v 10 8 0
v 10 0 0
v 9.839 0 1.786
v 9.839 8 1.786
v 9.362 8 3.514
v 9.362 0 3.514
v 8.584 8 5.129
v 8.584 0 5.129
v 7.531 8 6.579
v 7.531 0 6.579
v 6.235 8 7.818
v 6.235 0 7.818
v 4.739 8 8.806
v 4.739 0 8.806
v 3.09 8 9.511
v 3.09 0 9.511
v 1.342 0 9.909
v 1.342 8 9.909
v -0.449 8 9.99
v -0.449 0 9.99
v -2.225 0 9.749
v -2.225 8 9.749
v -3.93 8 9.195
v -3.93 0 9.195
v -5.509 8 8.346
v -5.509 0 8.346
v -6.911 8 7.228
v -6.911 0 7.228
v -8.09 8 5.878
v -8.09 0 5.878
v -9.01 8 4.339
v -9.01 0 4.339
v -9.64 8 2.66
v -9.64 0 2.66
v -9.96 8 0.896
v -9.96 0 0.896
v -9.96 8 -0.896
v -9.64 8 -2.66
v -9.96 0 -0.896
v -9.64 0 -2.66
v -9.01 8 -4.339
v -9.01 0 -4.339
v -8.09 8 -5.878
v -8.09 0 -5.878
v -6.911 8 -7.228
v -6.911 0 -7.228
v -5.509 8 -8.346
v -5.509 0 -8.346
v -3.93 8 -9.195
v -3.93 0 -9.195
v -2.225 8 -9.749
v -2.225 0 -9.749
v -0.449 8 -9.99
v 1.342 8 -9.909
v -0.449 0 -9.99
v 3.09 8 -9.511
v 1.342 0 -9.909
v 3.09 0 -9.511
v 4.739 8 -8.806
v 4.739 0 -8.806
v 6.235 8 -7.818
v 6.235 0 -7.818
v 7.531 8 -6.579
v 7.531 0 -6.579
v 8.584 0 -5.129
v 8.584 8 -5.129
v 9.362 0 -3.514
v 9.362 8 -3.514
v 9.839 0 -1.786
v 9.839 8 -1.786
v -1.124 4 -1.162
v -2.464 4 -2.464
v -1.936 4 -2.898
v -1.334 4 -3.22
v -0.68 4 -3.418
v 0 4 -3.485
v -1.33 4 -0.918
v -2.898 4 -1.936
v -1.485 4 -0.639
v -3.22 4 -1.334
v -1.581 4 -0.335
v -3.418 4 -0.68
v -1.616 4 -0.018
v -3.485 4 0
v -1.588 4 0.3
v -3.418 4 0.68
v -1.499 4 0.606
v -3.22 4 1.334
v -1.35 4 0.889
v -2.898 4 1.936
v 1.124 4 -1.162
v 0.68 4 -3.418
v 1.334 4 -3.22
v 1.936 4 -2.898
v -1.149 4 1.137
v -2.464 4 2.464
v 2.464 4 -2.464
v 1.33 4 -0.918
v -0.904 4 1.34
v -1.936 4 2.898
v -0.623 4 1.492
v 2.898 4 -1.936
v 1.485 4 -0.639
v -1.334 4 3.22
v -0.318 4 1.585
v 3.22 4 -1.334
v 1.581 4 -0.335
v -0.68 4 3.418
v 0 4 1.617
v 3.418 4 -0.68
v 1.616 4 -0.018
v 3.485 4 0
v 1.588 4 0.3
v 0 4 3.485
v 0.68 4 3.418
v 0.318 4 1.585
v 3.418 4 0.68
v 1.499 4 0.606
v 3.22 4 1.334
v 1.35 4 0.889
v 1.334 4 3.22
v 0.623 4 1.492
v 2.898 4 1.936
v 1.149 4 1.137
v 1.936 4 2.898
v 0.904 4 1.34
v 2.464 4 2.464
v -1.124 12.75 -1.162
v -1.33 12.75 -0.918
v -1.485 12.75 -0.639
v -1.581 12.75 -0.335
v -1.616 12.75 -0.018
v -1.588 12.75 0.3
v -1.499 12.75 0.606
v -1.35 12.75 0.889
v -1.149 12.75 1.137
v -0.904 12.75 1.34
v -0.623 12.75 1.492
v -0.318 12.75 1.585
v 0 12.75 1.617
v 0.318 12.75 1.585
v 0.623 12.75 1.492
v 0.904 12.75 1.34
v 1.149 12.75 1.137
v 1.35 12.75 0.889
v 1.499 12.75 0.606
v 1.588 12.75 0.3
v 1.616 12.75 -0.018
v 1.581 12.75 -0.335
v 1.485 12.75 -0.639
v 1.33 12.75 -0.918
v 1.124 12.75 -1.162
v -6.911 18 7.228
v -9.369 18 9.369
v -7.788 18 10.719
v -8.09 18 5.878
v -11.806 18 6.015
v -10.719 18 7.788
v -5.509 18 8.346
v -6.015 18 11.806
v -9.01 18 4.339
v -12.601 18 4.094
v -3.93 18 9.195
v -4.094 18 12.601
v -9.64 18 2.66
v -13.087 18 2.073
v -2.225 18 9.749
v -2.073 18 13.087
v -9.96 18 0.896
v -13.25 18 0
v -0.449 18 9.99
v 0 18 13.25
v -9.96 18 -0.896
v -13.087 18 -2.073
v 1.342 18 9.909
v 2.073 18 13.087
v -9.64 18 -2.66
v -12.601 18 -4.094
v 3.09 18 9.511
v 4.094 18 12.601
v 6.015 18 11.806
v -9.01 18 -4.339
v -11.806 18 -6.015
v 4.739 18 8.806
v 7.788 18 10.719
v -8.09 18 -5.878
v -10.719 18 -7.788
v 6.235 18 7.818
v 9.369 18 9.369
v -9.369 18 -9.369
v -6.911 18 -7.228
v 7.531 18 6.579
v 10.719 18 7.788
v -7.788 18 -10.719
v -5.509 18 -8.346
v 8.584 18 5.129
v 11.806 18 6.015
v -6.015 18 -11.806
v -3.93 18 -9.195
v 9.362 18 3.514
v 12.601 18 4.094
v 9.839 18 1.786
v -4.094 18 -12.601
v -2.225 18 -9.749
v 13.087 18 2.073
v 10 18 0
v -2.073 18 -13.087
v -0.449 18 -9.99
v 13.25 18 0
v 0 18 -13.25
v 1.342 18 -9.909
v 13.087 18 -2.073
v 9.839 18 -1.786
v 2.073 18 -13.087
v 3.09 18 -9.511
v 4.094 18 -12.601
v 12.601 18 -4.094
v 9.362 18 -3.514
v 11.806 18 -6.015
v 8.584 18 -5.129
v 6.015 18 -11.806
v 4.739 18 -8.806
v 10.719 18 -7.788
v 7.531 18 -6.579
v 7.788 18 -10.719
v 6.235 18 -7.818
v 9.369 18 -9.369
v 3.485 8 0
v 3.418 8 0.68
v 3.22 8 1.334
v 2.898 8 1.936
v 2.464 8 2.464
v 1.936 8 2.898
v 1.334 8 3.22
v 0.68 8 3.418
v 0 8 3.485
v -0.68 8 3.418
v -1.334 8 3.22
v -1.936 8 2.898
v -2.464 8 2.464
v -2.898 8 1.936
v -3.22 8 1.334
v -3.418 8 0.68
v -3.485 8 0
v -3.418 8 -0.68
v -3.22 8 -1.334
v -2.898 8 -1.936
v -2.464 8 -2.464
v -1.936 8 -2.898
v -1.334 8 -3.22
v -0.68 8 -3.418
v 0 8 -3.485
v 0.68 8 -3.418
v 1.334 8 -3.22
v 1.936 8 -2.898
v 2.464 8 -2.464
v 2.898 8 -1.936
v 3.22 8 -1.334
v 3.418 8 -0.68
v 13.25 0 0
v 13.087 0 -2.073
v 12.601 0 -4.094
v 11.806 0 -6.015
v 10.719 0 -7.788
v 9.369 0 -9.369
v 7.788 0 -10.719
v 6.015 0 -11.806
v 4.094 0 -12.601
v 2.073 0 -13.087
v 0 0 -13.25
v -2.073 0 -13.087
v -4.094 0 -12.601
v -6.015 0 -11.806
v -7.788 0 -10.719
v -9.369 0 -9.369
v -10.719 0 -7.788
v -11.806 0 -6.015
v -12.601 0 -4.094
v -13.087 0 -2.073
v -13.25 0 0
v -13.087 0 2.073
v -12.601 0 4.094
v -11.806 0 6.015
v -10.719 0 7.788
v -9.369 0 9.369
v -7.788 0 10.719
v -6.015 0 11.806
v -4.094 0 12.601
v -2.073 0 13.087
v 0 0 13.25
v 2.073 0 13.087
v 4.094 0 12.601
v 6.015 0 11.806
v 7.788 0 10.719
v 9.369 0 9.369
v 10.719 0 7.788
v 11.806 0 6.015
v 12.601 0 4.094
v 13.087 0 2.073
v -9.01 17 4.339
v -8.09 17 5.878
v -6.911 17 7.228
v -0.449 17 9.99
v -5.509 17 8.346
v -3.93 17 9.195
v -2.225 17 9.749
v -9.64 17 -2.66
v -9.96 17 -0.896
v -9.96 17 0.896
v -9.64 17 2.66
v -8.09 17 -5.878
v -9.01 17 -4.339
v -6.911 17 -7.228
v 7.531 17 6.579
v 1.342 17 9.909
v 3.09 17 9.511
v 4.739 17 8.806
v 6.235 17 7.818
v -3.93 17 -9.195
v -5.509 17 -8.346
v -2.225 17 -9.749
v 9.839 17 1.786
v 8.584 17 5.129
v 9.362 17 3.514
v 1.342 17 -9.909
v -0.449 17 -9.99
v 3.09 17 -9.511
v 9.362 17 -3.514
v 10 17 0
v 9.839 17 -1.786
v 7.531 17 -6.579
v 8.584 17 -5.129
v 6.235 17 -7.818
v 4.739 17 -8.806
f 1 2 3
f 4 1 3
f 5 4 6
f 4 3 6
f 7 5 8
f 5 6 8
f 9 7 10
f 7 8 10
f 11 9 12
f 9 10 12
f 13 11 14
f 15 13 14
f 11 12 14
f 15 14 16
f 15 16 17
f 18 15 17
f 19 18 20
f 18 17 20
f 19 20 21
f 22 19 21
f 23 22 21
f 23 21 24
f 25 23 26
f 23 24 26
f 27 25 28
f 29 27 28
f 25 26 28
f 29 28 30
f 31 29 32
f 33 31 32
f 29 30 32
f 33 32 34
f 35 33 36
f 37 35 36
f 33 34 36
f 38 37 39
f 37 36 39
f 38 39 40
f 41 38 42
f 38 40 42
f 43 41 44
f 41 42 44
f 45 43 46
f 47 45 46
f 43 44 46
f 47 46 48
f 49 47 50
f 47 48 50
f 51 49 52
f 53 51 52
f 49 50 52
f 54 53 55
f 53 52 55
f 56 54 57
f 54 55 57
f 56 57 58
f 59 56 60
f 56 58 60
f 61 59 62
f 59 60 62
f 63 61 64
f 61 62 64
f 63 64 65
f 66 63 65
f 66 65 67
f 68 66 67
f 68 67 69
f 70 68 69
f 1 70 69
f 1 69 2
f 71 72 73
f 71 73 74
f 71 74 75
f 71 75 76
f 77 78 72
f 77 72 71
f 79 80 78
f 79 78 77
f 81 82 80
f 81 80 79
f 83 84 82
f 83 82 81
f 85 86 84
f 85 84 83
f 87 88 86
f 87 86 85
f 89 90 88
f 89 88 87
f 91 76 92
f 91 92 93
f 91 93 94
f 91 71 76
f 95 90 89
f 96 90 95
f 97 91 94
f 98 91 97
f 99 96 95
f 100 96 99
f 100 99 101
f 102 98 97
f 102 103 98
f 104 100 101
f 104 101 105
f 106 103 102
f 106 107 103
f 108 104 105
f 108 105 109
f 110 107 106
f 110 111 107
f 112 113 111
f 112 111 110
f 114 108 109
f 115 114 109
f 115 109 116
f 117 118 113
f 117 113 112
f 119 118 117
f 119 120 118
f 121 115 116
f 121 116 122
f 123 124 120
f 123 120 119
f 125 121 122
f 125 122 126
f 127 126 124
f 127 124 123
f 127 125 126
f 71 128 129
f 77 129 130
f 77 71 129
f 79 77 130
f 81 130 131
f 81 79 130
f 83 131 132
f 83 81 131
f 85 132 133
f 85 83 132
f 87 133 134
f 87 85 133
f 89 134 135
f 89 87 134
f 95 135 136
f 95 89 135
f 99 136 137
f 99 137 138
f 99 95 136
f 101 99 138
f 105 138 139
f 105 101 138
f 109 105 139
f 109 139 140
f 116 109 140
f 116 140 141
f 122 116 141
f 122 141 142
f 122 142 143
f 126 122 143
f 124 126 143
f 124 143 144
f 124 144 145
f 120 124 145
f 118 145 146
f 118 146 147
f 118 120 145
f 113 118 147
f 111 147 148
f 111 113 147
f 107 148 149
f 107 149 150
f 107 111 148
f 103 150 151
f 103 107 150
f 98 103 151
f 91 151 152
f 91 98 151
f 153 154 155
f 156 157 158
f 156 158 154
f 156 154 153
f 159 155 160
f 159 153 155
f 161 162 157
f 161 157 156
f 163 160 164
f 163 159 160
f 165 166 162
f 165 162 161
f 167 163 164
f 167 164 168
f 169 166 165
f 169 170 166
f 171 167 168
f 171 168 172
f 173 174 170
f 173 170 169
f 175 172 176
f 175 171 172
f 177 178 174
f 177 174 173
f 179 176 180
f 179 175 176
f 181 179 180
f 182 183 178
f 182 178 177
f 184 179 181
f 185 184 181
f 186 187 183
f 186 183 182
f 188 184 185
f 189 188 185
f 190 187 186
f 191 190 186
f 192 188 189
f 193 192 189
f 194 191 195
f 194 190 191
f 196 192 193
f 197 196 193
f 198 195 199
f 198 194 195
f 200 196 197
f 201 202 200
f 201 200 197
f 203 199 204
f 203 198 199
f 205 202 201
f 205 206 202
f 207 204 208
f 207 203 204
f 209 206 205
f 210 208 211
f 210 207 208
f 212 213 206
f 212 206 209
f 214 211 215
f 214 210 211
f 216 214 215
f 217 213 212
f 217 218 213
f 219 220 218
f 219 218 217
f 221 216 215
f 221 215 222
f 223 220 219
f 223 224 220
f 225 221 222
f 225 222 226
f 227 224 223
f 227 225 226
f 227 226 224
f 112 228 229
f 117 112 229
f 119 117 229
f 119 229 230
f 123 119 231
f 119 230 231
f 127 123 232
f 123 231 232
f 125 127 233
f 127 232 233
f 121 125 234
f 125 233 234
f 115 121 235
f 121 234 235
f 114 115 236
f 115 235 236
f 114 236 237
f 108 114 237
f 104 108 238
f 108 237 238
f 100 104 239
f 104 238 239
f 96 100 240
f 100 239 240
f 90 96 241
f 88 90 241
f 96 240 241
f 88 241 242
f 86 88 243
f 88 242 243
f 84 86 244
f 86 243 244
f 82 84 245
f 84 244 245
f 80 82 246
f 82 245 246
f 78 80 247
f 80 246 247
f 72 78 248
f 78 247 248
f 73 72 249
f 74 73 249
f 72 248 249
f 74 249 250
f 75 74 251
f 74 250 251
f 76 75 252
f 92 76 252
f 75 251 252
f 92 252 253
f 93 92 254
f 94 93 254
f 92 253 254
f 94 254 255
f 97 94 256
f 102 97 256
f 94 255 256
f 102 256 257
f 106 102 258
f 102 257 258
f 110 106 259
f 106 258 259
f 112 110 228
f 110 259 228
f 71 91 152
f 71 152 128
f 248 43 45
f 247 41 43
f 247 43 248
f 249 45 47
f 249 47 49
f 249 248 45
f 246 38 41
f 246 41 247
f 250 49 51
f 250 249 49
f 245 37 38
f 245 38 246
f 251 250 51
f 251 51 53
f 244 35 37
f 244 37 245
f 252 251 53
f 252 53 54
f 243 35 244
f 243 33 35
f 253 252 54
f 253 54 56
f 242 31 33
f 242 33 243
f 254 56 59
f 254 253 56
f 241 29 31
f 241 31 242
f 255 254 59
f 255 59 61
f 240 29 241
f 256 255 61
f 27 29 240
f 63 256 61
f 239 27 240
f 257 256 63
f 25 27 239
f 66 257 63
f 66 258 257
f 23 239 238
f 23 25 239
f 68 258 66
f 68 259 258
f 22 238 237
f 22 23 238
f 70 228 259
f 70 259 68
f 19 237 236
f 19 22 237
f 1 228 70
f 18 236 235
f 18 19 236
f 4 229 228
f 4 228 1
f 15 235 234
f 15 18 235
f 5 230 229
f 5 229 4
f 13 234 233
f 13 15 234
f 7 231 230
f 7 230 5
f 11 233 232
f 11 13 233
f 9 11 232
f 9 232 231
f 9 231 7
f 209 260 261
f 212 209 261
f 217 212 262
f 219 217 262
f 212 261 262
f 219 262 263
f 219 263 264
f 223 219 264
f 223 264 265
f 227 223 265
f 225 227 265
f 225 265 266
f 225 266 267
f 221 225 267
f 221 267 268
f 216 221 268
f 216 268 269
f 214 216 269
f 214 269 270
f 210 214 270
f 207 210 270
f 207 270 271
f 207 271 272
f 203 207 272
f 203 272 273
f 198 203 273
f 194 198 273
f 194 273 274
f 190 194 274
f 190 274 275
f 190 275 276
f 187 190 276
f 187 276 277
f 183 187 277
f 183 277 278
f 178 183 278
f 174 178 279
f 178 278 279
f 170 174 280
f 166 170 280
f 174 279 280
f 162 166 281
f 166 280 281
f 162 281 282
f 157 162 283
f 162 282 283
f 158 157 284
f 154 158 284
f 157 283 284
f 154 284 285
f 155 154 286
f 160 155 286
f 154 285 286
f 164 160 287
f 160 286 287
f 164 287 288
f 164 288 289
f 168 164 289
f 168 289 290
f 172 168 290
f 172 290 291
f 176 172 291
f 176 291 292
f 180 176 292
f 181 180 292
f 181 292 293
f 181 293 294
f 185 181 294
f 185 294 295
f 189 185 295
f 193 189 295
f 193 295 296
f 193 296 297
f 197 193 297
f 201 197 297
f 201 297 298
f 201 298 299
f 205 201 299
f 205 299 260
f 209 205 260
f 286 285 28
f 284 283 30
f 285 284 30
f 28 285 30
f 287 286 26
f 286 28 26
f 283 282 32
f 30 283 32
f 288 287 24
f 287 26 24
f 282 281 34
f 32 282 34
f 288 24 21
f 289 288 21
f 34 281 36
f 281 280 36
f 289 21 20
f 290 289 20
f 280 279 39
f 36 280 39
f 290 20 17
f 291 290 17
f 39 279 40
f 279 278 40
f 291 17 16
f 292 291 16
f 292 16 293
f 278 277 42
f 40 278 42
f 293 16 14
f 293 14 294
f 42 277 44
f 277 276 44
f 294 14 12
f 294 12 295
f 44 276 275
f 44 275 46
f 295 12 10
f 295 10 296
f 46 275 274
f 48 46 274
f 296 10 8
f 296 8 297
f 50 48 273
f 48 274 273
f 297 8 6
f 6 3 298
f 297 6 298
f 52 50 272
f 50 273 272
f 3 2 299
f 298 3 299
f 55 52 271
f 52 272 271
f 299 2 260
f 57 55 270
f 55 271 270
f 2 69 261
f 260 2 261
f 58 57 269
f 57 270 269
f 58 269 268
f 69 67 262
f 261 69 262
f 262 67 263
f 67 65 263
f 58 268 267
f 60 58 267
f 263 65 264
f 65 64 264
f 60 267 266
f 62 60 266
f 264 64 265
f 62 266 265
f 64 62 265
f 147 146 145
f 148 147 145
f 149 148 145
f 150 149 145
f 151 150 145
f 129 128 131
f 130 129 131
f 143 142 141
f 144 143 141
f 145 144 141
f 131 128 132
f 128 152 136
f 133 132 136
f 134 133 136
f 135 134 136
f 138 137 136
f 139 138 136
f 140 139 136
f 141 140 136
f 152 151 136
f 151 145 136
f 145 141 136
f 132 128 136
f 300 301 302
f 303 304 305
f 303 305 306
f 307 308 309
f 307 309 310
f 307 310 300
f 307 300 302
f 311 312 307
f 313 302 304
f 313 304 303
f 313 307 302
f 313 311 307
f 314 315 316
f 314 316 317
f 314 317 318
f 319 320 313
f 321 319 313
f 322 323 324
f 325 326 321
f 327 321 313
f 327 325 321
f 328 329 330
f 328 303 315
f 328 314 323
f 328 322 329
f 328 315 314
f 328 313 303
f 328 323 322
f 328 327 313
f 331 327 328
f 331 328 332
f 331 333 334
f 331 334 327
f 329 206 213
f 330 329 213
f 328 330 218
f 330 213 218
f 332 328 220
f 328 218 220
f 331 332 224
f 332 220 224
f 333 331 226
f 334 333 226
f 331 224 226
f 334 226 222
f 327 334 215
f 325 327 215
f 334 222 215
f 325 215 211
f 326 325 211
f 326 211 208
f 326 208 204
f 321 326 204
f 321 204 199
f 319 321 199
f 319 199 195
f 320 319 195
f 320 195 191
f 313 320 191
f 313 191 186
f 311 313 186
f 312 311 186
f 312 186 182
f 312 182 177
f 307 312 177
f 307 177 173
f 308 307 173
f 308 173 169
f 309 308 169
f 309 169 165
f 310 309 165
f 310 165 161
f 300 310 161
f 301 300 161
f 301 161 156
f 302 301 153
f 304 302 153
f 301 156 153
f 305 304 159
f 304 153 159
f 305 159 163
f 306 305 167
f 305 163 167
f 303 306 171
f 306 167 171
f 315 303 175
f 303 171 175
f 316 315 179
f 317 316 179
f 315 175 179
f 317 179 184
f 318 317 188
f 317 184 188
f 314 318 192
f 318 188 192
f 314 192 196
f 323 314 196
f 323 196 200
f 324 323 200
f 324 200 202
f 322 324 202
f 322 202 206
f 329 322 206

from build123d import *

# Parameters (mm, degrees)
SKETCH1_R           = 13.25
BOSS_EXTRUDE1_DEPTH = 35
SKETCH7_R           = 10
CUT_EXTRUDE4_DEPTH  = 8
SKETCH10_R          = 3.485
BOSS_EXTRUDE3_DEPTH = 4
CUT_EXTRUDE5_DEPTH  = 8.75
SKETCH13_R          = 10
CUT_EXTRUDE6_DEPTH  = 18
SKETCH14_R          = 13.25
CUT_EXTRUDE7_DEPTH  = 17


with BuildPart() as part:
    # Sketch1 → Boss-Extrude1 (new body)
    with BuildSketch(Plane(origin=(0, 0, 0), x_dir=(1, 0, 0), z_dir=(0, 1, 0))):
        Circle(SKETCH1_R)
    extrude(amount=BOSS_EXTRUDE1_DEPTH)

    # Sketch7 → Cut-Extrude4 (cut)
    with BuildSketch(Plane.XZ):
        Circle(SKETCH7_R)
    extrude(amount=-CUT_EXTRUDE4_DEPTH, mode=Mode.SUBTRACT)

    # Sketch10 → Boss-Extrude3 (add)
    with BuildSketch(Plane.XZ.offset(-8)):
        Circle(SKETCH10_R)
    extrude(amount=BOSS_EXTRUDE3_DEPTH)

    # Sketch11 → Cut-Extrude5 (cut)
    with BuildSketch(Plane.XZ.offset(-4)):
        with BuildLine():
            Line((1.123990489, -1.161812868), (-1.123990489, -1.161812868))
            ThreePointArc((-1.123990489, -1.161812868), (0, 1.616528304), (1.123990489, -1.161812868))
        make_face()
    extrude(amount=-CUT_EXTRUDE5_DEPTH, mode=Mode.SUBTRACT)

    # Sketch13 → Cut-Extrude6 (cut)
    with BuildSketch(Plane(origin=(0, 35, 0), x_dir=(1, 0, 0), z_dir=(0, 1, 0))):
        Circle(SKETCH13_R)
    extrude(amount=-CUT_EXTRUDE6_DEPTH, mode=Mode.SUBTRACT)

    # Sketch14 → Cut-Extrude7 (cut)
    with BuildSketch(Plane(origin=(0, 35, 0), x_dir=(1, 0, 0), z_dir=(0, 1, 0))):
        Circle(SKETCH14_R)
    extrude(amount=-CUT_EXTRUDE7_DEPTH, mode=Mode.SUBTRACT)


solid = part.part
